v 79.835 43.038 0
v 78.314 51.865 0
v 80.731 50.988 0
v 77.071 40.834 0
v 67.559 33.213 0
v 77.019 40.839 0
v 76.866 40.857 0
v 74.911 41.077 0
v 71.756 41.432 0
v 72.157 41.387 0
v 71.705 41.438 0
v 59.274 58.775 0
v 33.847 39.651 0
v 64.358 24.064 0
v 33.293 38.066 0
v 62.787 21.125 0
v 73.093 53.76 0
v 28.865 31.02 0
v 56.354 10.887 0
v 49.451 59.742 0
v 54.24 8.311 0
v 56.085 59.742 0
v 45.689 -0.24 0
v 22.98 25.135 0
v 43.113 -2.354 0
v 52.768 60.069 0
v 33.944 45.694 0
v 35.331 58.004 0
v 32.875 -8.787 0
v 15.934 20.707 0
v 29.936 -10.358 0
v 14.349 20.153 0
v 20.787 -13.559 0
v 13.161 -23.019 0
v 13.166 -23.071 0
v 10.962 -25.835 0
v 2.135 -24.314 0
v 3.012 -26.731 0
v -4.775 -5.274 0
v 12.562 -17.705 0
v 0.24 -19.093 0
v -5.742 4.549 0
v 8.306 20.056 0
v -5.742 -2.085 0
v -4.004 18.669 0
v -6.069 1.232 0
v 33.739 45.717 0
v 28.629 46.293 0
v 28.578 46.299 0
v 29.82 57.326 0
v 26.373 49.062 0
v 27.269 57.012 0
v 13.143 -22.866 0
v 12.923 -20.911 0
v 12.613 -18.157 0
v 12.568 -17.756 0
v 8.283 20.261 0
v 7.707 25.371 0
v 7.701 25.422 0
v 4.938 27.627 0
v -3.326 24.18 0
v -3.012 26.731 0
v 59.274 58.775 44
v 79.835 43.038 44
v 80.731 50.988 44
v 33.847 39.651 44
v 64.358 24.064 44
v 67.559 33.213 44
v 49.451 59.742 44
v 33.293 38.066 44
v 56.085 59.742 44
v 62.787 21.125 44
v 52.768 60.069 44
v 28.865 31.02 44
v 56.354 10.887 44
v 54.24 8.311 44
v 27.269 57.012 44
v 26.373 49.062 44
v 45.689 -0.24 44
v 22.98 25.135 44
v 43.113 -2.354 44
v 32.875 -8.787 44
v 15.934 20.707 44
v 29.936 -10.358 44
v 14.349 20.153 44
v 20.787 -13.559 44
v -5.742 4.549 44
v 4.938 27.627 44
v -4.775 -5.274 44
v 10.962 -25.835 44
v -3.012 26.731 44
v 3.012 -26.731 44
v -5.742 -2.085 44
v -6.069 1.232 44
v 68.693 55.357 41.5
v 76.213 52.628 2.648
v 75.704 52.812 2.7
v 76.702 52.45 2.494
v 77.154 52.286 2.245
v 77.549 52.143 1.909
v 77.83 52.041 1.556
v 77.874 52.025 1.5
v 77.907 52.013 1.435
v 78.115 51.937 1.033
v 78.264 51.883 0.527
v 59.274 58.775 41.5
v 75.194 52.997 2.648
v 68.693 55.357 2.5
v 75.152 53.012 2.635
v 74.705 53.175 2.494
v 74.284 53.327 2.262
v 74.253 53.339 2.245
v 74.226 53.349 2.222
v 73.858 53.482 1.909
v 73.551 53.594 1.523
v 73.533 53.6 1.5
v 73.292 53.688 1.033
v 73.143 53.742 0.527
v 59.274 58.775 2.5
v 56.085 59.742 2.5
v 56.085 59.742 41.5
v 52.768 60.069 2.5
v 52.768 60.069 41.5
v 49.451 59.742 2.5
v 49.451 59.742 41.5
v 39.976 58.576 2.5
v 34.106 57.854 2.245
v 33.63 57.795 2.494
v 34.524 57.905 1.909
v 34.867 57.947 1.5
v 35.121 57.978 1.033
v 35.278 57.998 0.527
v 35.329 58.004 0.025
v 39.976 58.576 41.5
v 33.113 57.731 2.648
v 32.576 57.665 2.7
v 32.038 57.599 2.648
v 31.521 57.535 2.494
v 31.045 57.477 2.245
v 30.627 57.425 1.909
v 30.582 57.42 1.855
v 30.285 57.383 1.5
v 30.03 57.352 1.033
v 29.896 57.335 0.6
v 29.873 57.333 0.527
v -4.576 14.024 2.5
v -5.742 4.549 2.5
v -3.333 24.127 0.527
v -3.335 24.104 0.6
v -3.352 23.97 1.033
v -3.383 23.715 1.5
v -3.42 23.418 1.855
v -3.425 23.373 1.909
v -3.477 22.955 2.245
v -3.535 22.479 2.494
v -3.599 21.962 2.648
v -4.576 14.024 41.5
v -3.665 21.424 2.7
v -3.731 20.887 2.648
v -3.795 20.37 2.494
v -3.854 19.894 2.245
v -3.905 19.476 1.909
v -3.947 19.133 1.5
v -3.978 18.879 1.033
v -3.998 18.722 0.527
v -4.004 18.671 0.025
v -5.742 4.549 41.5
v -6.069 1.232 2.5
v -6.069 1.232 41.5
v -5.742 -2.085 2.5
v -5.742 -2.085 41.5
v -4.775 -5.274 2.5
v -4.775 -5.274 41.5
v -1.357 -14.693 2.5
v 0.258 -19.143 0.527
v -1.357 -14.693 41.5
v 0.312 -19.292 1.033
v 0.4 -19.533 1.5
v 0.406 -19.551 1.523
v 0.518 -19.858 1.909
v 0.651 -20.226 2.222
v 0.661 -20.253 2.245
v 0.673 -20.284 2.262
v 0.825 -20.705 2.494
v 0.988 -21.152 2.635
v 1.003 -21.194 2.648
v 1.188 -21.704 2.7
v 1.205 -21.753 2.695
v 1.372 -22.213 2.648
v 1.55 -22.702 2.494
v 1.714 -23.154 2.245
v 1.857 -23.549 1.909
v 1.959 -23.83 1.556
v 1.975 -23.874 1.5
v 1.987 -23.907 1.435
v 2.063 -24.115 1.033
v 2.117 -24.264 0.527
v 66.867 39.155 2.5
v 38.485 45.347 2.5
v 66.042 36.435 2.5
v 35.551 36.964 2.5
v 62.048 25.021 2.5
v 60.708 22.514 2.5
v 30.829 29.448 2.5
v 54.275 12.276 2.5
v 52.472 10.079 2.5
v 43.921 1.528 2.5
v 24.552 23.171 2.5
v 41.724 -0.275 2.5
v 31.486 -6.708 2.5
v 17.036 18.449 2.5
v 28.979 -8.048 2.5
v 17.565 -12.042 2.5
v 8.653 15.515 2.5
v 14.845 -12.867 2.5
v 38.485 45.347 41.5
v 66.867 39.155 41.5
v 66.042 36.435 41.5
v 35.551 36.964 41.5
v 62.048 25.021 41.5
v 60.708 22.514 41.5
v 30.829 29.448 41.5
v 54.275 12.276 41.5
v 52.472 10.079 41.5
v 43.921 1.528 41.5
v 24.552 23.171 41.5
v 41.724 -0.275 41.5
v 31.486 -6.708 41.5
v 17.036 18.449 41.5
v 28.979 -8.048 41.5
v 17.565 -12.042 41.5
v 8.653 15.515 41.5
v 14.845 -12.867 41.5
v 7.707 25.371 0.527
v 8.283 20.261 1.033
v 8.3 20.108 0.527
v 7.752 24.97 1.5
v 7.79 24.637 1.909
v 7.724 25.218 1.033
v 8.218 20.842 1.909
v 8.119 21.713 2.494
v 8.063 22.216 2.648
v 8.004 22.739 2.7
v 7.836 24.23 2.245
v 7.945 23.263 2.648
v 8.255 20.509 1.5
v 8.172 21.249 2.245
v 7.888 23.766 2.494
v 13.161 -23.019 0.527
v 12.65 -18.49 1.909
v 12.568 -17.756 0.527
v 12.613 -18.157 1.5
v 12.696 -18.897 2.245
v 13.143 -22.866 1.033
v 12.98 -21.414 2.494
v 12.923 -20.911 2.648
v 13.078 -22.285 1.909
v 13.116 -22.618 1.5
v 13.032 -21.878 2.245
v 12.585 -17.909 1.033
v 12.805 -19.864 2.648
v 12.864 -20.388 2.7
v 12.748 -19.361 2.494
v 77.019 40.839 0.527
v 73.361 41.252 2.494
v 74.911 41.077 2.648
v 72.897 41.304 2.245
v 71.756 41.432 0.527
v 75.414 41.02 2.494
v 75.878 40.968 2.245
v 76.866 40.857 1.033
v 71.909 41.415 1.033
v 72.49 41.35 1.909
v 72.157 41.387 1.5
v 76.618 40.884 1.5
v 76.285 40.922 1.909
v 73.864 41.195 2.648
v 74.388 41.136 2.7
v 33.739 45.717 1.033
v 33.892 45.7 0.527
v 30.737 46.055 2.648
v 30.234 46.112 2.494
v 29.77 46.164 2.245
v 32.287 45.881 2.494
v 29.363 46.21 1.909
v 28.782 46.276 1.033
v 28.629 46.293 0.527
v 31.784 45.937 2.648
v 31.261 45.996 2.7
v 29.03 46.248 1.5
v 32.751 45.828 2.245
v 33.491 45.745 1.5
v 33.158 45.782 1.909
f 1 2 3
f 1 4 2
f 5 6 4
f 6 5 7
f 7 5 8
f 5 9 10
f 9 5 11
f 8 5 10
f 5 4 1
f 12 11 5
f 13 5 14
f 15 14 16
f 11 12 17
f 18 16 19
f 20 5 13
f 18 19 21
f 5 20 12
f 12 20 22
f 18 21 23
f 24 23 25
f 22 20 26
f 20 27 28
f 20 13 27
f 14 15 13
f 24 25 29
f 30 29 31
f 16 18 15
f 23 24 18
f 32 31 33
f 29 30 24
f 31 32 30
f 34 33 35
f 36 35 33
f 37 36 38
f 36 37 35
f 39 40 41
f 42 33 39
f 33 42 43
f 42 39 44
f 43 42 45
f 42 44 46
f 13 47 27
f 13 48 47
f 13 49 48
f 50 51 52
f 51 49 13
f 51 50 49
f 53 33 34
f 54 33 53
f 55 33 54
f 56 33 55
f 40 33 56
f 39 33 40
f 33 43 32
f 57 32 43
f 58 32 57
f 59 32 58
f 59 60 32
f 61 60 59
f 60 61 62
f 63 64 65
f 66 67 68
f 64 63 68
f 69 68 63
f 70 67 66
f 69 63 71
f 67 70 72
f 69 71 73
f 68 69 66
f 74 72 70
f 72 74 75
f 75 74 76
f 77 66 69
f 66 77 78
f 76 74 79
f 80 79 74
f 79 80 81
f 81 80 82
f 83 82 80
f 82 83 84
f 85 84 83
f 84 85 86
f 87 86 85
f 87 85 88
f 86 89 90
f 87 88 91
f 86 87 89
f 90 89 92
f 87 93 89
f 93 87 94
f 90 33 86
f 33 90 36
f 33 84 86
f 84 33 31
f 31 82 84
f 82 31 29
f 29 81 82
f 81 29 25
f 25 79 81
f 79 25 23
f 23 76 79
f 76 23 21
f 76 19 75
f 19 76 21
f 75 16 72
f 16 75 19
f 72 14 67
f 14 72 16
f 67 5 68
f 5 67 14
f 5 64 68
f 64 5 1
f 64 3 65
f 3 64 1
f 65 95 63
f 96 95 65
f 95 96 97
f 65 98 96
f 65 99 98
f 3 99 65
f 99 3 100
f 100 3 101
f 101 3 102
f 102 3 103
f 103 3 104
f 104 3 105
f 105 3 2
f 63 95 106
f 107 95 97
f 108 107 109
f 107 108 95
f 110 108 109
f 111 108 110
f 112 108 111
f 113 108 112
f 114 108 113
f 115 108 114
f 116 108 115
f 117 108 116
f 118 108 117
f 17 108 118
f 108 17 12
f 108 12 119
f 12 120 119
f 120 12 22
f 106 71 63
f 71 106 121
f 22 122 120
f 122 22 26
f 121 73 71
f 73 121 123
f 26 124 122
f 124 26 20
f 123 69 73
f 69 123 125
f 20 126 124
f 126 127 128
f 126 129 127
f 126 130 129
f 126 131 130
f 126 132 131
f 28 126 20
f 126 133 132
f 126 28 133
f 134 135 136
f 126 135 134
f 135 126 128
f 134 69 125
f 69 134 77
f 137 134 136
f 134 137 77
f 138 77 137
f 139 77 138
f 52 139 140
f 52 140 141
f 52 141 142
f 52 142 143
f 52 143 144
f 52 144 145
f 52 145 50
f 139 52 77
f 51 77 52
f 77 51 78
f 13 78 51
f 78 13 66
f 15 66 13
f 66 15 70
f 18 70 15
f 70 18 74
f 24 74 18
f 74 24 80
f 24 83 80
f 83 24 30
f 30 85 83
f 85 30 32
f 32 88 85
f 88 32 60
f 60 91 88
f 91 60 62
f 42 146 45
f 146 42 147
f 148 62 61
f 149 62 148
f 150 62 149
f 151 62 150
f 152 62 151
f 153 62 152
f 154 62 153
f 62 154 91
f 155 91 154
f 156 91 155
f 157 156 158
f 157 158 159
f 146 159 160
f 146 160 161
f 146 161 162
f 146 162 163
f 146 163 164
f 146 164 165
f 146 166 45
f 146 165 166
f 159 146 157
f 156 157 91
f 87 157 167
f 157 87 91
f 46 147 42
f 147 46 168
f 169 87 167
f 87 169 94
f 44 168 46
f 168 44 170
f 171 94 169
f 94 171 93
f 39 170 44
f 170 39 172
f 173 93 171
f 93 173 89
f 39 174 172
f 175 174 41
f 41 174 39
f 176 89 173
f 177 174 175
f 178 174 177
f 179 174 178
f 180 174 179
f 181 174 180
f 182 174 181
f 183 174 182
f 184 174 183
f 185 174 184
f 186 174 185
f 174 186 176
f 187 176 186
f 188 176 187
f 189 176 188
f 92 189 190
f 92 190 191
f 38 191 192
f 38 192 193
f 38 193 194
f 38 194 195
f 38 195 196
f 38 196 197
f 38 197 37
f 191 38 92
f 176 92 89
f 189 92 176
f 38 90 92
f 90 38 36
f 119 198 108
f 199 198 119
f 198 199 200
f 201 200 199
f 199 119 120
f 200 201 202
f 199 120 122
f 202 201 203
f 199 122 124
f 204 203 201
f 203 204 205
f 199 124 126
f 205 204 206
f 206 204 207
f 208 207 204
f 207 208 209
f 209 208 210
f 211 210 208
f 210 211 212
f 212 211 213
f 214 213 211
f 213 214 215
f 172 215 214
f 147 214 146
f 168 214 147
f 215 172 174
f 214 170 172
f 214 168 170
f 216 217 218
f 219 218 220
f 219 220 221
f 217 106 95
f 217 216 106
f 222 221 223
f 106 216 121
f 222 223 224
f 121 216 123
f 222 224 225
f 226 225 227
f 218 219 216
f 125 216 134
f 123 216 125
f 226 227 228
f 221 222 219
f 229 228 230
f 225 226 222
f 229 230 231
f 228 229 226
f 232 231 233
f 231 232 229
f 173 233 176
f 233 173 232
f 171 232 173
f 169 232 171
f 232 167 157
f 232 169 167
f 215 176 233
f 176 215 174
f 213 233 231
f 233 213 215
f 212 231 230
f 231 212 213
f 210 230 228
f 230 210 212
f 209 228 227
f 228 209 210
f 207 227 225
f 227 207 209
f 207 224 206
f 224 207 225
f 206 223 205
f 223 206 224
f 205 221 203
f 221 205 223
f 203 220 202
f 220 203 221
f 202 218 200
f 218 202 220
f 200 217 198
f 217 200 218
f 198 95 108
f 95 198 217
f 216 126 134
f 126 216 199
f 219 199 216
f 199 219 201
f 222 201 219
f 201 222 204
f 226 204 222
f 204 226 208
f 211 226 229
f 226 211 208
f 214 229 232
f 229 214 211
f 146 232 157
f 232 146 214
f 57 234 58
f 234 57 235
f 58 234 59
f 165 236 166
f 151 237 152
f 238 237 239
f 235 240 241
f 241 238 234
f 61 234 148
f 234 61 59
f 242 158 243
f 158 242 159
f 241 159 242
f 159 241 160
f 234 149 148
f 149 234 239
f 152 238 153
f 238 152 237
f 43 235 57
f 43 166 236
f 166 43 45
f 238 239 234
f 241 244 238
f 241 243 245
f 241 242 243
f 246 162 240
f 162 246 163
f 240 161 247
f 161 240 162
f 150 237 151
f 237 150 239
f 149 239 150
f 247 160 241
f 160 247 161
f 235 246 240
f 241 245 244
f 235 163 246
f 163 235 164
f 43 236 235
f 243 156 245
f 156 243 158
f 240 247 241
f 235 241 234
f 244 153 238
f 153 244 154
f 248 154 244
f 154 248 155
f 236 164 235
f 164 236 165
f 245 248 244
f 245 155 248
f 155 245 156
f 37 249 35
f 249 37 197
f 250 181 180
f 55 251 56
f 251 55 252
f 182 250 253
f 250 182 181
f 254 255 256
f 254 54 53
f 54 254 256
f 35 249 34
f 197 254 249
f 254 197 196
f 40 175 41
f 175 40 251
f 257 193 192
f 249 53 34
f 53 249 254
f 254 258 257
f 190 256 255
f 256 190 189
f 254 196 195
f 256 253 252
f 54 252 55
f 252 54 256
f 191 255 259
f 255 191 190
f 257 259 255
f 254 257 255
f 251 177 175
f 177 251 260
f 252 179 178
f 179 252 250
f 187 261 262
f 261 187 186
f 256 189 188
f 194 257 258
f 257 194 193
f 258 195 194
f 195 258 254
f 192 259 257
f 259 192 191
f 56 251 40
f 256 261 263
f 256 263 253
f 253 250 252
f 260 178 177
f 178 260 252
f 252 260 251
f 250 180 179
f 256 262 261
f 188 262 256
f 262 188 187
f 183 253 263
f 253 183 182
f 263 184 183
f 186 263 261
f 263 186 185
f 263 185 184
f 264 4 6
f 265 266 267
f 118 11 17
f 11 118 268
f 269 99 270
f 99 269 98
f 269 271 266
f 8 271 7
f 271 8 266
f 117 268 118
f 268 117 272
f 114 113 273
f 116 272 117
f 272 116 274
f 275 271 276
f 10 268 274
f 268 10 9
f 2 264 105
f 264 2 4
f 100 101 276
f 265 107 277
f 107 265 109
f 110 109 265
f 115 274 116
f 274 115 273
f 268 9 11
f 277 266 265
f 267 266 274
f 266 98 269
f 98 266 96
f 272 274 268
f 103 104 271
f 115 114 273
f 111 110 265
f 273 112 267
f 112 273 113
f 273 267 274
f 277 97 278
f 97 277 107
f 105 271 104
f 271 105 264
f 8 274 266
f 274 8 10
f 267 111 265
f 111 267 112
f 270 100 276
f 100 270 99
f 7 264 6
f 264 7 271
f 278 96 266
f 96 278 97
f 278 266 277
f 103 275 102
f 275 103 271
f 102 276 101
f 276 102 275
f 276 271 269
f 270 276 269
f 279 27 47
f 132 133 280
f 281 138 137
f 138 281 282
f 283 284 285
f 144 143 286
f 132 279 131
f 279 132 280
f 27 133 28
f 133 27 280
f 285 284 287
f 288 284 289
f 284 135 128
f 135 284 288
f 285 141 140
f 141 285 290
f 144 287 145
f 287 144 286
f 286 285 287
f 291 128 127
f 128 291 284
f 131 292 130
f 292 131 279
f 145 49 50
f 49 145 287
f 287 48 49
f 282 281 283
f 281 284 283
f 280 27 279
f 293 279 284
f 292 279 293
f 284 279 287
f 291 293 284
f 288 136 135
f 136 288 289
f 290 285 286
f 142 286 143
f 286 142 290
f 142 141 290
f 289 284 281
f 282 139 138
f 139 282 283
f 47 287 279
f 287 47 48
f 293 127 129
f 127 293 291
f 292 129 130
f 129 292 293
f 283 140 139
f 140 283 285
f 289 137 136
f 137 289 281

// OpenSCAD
$fn = 32;

// ----------------------------------------------------------------------
// Air duct: 34 mm duct, 2.5 mm wall, 44 mm across
// ----------------------------------------------------------------------

// --- parameters (mm) ---
duct_r = 17;              // duct core radius
duct_d = 34;              // duct core diameter
wall = 2.5;               // duct wall thickness
height = 44;              // duct width (extrusion height)
port_r = 26.9;            // port flange half width
port_d = 53.8;            // port flange width
port_t = 8;               // port flange thickness
bolt_d = 5.4;             // port bolt holes
bolt_offset = 21.7;       // bolt hole offset from the port axis

difference() {
  /* outer hull chain: tube with a flat flange plate at every port */
  linear_extrude(height = 44) {
    hull() {
      polygon([[3.012, -26.731], [-3.012, 26.731], [4.938, 27.627], [10.962, -25.835]]);
      translate([10.931, 1.232]) circle(r = 17);
    }
    hull() {
      translate([10.931, 1.232]) circle(r = 17);
      translate([12.016, 1.354]) circle(r = 17);
    }
    hull() {
      translate([12.016, 1.354]) circle(r = 17);
      translate([23.43, 5.348]) circle(r = 17);
    }
    hull() {
      translate([23.43, 5.348]) circle(r = 17);
      translate([33.668, 11.781]) circle(r = 17);
    }
    hull() {
      translate([33.668, 11.781]) circle(r = 17);
      translate([42.219, 20.332]) circle(r = 17);
    }
    hull() {
      translate([42.219, 20.332]) circle(r = 17);
      translate([48.652, 30.57]) circle(r = 17);
    }
    hull() {
      translate([48.652, 30.57]) circle(r = 17);
      translate([52.646, 41.984]) circle(r = 17);
    }
    hull() {
      translate([52.646, 41.984]) circle(r = 17);
      translate([52.768, 43.069]) circle(r = 17);
    }
    hull() {
      translate([52.768, 43.069]) circle(r = 17);
      polygon([[27.269, 57.012], [80.731, 50.988], [79.835, 43.038], [26.373, 49.062]]);
    }
  }
  /* air passage: the same chain inset by the wall, 5 mm proud of the ports */
  translate([0, 0, 2.5]) linear_extrude(height = 39) {
    hull() {
      translate([-4.969, -0.56]) circle(r = 14.5);
      translate([12.016, 1.354]) circle(r = 14.5);
    }
    hull() {
      translate([12.016, 1.354]) circle(r = 14.5);
      translate([23.43, 5.348]) circle(r = 14.5);
    }
    hull() {
      translate([23.43, 5.348]) circle(r = 14.5);
      translate([33.668, 11.781]) circle(r = 14.5);
    }
    hull() {
      translate([33.668, 11.781]) circle(r = 14.5);
      translate([42.219, 20.332]) circle(r = 14.5);
    }
    hull() {
      translate([42.219, 20.332]) circle(r = 14.5);
      translate([48.652, 30.57]) circle(r = 14.5);
    }
    hull() {
      translate([48.652, 30.57]) circle(r = 14.5);
      translate([52.646, 41.984]) circle(r = 14.5);
    }
    hull() {
      translate([52.646, 41.984]) circle(r = 14.5);
      translate([54.56, 58.969]) circle(r = 14.5);
    }
  }
  translate([0, 0]) rotate([0, 0, -83.57]) translate([-21.7, -2.5]) rotate([-90, 0, 0]) cylinder(h = 13, d = 5.4);
  translate([0, 0]) rotate([0, 0, -83.57]) translate([21.7, -2.5]) rotate([-90, 0, 0]) cylinder(h = 13, d = 5.4);
  translate([54, 54]) rotate([0, 0, 173.57]) translate([-21.7, -2.5]) rotate([-90, 0, 0]) cylinder(h = 13, d = 5.4);
  translate([54, 54]) rotate([0, 0, 173.57]) translate([21.7, -2.5]) rotate([-90, 0, 0]) cylinder(h = 13, d = 5.4);
}
